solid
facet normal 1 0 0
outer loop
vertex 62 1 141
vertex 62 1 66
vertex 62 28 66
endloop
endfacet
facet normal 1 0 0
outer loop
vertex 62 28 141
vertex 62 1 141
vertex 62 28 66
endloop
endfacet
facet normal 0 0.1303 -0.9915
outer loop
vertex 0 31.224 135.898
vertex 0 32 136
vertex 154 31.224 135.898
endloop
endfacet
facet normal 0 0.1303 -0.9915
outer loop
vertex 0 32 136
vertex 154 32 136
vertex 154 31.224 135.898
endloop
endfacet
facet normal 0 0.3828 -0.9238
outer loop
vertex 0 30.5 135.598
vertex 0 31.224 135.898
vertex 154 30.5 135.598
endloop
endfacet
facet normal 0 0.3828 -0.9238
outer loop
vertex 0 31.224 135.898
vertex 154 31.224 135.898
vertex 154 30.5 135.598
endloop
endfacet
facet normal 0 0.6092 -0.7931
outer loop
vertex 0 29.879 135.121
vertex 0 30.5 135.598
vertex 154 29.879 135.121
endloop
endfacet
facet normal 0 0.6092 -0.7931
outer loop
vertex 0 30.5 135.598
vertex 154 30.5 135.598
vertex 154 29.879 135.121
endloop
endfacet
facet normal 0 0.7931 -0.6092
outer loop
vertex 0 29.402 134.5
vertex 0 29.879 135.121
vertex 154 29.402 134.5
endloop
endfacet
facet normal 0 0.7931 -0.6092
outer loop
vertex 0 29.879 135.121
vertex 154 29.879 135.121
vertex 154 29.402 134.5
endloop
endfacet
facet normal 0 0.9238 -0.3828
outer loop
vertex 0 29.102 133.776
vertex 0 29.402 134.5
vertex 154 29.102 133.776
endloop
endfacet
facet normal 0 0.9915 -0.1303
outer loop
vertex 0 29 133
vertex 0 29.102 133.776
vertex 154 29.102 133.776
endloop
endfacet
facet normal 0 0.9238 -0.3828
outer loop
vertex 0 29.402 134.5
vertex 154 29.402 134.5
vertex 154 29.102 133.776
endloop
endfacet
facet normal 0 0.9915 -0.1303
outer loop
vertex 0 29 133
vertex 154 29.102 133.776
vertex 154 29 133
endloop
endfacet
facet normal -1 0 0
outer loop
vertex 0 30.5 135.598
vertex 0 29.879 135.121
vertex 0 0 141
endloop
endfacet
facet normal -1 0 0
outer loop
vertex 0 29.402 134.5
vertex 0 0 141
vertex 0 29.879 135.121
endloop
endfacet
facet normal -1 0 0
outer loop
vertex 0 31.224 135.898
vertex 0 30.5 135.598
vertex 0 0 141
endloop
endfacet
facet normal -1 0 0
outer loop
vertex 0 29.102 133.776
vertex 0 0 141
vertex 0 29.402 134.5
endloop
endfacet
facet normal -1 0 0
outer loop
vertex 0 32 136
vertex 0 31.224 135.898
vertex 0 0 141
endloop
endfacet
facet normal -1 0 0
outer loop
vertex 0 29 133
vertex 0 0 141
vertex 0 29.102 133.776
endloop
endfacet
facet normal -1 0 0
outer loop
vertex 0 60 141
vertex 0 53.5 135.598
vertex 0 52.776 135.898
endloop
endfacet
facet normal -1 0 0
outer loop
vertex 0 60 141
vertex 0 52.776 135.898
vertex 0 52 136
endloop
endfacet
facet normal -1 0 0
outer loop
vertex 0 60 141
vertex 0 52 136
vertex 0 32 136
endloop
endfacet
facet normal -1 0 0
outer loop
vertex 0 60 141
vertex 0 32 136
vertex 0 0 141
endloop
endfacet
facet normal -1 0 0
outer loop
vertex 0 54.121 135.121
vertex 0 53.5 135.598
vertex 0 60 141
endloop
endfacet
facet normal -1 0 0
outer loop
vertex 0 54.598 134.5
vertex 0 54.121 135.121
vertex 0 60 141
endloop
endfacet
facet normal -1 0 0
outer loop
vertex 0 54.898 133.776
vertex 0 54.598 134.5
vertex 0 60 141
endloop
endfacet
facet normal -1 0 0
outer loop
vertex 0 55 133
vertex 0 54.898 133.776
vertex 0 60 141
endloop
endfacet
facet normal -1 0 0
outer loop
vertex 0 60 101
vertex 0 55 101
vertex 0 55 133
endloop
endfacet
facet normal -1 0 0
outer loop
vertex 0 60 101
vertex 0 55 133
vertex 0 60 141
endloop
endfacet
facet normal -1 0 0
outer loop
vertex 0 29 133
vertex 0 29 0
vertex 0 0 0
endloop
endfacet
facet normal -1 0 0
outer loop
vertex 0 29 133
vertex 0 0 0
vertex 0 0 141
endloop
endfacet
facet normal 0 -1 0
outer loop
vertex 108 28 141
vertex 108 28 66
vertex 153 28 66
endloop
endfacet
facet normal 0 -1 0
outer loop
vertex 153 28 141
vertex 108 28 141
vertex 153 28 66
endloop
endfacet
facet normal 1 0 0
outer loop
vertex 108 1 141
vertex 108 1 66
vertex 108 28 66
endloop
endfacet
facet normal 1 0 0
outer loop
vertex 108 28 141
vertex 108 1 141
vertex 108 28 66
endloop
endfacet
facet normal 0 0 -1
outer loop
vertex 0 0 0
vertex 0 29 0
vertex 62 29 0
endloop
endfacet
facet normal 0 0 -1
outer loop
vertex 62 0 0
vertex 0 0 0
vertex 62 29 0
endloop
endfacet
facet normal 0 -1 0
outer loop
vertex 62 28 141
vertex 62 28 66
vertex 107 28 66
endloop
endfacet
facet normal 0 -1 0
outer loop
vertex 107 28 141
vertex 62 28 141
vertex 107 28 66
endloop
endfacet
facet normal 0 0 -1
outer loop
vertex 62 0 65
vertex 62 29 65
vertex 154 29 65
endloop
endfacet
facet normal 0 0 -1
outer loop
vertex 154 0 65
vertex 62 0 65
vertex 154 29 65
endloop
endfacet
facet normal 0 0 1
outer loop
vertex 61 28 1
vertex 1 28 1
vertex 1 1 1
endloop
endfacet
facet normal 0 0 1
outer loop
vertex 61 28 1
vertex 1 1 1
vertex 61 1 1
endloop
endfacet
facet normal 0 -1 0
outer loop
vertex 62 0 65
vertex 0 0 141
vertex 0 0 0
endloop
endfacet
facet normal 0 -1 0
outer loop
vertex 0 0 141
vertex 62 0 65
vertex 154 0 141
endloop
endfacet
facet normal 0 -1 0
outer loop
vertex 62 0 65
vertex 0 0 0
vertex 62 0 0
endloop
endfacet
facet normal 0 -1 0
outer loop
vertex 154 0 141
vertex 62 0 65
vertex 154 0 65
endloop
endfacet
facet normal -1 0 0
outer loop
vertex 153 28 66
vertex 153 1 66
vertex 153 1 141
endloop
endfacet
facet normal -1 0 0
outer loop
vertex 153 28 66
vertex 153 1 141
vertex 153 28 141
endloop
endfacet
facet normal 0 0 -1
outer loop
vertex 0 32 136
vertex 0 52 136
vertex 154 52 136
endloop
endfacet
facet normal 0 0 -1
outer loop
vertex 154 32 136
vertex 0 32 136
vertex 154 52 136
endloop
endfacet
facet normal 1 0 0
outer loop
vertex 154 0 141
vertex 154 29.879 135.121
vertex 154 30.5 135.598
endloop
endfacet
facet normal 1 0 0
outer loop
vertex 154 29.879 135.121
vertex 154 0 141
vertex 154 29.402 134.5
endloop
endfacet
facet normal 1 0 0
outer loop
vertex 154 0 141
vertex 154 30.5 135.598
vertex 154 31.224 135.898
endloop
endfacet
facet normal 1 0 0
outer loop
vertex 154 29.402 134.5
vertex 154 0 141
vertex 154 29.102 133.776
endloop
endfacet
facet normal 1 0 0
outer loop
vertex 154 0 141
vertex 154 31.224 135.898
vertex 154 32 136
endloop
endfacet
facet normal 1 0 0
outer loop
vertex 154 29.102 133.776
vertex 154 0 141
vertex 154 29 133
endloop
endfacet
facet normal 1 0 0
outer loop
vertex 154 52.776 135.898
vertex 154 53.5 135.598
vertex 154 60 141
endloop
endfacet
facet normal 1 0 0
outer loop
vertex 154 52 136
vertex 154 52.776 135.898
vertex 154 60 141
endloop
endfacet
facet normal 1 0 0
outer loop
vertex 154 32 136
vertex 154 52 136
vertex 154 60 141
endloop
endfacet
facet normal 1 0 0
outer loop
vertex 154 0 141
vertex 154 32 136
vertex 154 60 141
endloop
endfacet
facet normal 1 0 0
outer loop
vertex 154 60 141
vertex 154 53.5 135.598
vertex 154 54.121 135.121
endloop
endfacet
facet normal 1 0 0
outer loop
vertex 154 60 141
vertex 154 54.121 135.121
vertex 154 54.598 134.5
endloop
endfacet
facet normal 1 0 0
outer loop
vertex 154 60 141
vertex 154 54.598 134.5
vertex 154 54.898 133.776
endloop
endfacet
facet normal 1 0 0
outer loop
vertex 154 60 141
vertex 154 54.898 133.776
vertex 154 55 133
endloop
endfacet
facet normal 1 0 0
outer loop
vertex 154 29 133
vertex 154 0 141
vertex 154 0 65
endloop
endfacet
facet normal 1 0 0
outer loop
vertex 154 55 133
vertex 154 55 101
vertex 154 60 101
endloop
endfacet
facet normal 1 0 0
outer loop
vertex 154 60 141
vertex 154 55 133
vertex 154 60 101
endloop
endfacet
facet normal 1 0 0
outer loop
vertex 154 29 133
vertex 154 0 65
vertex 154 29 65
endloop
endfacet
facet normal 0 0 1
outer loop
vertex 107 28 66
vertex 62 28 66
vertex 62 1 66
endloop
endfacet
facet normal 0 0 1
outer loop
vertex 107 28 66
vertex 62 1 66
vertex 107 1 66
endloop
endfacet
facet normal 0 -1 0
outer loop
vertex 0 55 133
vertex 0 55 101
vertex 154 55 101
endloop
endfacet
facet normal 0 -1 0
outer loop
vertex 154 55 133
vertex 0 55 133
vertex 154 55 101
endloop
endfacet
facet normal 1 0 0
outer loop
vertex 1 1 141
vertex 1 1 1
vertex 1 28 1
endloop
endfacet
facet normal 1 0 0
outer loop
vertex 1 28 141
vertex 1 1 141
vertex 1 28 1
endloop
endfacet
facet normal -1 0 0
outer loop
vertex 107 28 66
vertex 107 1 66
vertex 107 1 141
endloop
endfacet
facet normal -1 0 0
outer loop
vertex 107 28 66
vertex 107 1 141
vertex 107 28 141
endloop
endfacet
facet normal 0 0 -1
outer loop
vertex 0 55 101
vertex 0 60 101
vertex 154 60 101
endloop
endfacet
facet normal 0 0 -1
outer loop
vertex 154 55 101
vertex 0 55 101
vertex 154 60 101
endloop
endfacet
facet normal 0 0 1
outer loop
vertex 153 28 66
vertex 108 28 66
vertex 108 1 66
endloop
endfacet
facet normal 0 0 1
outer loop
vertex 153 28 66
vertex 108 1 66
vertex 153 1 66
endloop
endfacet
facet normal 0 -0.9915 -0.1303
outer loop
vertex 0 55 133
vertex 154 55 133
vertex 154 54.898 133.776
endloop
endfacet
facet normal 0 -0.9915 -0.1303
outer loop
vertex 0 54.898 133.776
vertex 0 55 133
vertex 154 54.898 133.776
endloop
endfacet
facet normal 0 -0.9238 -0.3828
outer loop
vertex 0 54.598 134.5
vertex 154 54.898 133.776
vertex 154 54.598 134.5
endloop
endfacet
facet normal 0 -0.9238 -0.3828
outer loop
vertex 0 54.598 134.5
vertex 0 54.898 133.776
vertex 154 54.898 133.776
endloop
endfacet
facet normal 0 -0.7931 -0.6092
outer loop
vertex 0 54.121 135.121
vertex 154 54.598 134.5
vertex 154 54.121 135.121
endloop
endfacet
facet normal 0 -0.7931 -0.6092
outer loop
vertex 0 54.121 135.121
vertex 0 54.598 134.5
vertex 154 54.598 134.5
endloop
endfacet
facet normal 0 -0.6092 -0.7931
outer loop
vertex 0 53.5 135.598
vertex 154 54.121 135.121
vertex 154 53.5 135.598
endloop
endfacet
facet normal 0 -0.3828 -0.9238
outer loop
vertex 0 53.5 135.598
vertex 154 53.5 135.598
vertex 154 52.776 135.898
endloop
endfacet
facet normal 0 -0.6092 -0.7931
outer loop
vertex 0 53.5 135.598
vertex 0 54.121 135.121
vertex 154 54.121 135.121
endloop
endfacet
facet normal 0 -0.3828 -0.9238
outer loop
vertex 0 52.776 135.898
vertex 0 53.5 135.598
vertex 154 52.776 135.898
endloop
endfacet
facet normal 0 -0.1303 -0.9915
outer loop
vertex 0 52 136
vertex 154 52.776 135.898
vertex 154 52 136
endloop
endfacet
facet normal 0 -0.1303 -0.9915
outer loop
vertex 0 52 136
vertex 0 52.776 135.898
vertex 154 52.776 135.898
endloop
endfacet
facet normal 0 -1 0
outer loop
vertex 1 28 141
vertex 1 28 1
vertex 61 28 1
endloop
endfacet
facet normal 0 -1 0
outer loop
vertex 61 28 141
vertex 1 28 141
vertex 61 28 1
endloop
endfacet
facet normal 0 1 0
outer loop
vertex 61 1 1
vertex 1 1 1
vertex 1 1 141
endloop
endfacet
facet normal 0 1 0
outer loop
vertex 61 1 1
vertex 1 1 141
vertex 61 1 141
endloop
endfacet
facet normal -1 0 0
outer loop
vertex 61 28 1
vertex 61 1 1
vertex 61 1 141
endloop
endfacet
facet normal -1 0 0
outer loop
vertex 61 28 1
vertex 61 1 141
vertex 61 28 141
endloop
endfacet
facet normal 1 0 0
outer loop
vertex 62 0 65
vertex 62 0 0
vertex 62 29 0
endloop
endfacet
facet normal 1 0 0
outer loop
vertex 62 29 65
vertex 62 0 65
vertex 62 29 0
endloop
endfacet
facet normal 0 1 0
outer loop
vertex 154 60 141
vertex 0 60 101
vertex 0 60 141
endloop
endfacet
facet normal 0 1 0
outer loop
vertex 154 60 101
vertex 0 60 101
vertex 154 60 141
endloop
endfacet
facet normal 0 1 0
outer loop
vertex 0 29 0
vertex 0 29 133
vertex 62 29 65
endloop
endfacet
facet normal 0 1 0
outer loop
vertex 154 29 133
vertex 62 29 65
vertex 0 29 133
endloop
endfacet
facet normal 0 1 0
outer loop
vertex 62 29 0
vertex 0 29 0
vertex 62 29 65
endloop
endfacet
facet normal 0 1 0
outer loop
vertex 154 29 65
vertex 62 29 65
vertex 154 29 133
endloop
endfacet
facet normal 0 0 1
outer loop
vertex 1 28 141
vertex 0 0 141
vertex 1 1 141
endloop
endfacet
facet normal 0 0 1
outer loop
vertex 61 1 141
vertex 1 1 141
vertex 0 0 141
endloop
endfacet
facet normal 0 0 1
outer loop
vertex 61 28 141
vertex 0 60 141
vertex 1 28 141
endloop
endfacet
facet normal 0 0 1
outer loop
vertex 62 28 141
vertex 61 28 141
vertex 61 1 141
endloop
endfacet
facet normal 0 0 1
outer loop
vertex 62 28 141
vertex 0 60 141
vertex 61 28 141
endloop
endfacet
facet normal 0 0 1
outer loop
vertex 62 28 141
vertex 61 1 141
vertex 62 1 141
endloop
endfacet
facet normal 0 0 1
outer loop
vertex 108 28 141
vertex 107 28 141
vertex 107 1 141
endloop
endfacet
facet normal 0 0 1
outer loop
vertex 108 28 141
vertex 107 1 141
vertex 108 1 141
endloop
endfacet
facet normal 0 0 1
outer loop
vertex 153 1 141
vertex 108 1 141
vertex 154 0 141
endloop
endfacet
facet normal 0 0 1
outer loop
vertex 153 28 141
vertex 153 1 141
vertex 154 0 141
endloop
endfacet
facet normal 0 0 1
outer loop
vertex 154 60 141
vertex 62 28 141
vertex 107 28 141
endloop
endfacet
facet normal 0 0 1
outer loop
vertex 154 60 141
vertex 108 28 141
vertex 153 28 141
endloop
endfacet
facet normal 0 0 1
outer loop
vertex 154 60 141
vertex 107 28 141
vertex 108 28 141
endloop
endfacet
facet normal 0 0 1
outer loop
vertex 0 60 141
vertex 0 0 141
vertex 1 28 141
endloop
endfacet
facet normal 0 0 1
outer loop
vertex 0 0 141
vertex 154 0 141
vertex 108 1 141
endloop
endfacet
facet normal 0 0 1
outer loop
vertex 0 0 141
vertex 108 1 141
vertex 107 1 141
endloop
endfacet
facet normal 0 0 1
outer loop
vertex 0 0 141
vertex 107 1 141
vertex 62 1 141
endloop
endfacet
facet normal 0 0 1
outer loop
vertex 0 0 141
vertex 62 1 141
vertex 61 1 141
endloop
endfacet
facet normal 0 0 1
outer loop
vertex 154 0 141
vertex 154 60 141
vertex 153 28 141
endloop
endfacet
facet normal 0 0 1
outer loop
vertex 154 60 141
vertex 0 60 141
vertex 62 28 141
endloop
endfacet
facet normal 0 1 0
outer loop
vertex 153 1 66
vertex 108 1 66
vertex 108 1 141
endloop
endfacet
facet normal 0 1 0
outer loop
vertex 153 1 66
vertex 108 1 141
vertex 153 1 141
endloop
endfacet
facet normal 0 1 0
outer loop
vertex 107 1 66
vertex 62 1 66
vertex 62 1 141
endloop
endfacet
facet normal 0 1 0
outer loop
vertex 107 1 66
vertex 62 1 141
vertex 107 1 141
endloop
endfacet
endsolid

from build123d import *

# Parameters (mm, degrees)
BOX003_W     = 45
BOX003_H     = 27
BOX003_DEPTH = 75
BOX005_W     = 45
BOX005_H     = 27
BOX005_DEPTH = 75
BOX001_W     = 60
BOX001_H     = 27
BOX001_DEPTH = 140
BOX006_W     = 154
BOX006_H     = 31
BOX006_DEPTH = 5
BOX007_W     = 154
BOX007_H     = 5
BOX007_DEPTH = 40
BOX002_W     = 47
BOX002_H     = 29
BOX002_DEPTH = 76
BOX004_W     = 47
BOX004_H     = 29
BOX004_DEPTH = 76
BOX_W        = 62
BOX_H        = 29
BOX_DEPTH    = 141
FILLET_R     = 3


with BuildPart() as cube003:
    # Box003 → Box003 (new body)
    with BuildSketch(Plane(origin=(62, 1, 66), x_dir=(1, 0, 0), z_dir=(0, 0, 1))):
        with Locations((22.5, 13.5)):
            Rectangle(BOX003_W, BOX003_H)
    extrude(amount=BOX003_DEPTH)


with BuildPart() as cube005:
    # Box005 → Box005 (new body)
    with BuildSketch(Plane(origin=(108, 1, 66), x_dir=(1, 0, 0), z_dir=(0, 0, 1))):
        with Locations((22.5, 13.5)):
            Rectangle(BOX005_W, BOX005_H)
    extrude(amount=BOX005_DEPTH)


with BuildPart() as fusion001:
    # Box001 → Box001 (new body)
    with BuildSketch(Plane(origin=(1, 1, 1), x_dir=(1, 0, 0), z_dir=(0, 0, 1))):
        with Locations((30, 13.5)):
            Rectangle(BOX001_W, BOX001_H)
    extrude(amount=BOX001_DEPTH)

    # Fusion001: union Cube003, Cube005
    add(cube003.part)
    add(cube005.part)


with BuildPart() as cube006:
    # Box006 → Box006 (new body)
    with BuildSketch(Plane(origin=(0, 29, 136), x_dir=(1, 0, 0), z_dir=(0, 0, 1))):
        with Locations((77, 15.5)):
            Rectangle(BOX006_W, BOX006_H)
    extrude(amount=BOX006_DEPTH)


with BuildPart() as cube007:
    # Box007 → Box007 (new body)
    with BuildSketch(Plane(origin=(0, 55, 101), x_dir=(1, 0, 0), z_dir=(0, 0, 1))):
        with Locations((77, 2.5)):
            Rectangle(BOX007_W, BOX007_H)
    extrude(amount=BOX007_DEPTH)


with BuildPart() as cube002:
    # Box002 → Box002 (new body)
    with BuildSketch(Plane(origin=(61, 0, 65), x_dir=(1, 0, 0), z_dir=(0, 0, 1))):
        with Locations((23.5, 14.5)):
            Rectangle(BOX002_W, BOX002_H)
    extrude(amount=BOX002_DEPTH)


with BuildPart() as cube004:
    # Box004 → Box004 (new body)
    with BuildSketch(Plane(origin=(107, 0, 65), x_dir=(1, 0, 0), z_dir=(0, 0, 1))):
        with Locations((23.5, 14.5)):
            Rectangle(BOX004_W, BOX004_H)
    extrude(amount=BOX004_DEPTH)


with BuildPart() as fillet_body:
    # Box → Box (new body)
    with BuildSketch(Plane.XY):
        with Locations((31, 14.5)):
            Rectangle(BOX_W, BOX_H)
    extrude(amount=BOX_DEPTH)

    # Fusion: union Cube002, Cube004
    add(cube002.part)
    add(cube004.part)

    # Fusion002: union Cube006, Cube007
    add(cube006.part)
    add(cube007.part)

    # Cut: cut Fusion001
    add(fusion001.part, mode=Mode.SUBTRACT)

    # Fillet
    fillet_edges = [fillet_body.edges().sort_by_distance(p)[0] for p in [
        (77, 55, 136),
        (131, 29, 136),
        (84.5, 29, 136),
        (30.5, 29, 136),
    ]]
    fillet(fillet_edges, radius=FILLET_R)


solid = fillet_body.part
